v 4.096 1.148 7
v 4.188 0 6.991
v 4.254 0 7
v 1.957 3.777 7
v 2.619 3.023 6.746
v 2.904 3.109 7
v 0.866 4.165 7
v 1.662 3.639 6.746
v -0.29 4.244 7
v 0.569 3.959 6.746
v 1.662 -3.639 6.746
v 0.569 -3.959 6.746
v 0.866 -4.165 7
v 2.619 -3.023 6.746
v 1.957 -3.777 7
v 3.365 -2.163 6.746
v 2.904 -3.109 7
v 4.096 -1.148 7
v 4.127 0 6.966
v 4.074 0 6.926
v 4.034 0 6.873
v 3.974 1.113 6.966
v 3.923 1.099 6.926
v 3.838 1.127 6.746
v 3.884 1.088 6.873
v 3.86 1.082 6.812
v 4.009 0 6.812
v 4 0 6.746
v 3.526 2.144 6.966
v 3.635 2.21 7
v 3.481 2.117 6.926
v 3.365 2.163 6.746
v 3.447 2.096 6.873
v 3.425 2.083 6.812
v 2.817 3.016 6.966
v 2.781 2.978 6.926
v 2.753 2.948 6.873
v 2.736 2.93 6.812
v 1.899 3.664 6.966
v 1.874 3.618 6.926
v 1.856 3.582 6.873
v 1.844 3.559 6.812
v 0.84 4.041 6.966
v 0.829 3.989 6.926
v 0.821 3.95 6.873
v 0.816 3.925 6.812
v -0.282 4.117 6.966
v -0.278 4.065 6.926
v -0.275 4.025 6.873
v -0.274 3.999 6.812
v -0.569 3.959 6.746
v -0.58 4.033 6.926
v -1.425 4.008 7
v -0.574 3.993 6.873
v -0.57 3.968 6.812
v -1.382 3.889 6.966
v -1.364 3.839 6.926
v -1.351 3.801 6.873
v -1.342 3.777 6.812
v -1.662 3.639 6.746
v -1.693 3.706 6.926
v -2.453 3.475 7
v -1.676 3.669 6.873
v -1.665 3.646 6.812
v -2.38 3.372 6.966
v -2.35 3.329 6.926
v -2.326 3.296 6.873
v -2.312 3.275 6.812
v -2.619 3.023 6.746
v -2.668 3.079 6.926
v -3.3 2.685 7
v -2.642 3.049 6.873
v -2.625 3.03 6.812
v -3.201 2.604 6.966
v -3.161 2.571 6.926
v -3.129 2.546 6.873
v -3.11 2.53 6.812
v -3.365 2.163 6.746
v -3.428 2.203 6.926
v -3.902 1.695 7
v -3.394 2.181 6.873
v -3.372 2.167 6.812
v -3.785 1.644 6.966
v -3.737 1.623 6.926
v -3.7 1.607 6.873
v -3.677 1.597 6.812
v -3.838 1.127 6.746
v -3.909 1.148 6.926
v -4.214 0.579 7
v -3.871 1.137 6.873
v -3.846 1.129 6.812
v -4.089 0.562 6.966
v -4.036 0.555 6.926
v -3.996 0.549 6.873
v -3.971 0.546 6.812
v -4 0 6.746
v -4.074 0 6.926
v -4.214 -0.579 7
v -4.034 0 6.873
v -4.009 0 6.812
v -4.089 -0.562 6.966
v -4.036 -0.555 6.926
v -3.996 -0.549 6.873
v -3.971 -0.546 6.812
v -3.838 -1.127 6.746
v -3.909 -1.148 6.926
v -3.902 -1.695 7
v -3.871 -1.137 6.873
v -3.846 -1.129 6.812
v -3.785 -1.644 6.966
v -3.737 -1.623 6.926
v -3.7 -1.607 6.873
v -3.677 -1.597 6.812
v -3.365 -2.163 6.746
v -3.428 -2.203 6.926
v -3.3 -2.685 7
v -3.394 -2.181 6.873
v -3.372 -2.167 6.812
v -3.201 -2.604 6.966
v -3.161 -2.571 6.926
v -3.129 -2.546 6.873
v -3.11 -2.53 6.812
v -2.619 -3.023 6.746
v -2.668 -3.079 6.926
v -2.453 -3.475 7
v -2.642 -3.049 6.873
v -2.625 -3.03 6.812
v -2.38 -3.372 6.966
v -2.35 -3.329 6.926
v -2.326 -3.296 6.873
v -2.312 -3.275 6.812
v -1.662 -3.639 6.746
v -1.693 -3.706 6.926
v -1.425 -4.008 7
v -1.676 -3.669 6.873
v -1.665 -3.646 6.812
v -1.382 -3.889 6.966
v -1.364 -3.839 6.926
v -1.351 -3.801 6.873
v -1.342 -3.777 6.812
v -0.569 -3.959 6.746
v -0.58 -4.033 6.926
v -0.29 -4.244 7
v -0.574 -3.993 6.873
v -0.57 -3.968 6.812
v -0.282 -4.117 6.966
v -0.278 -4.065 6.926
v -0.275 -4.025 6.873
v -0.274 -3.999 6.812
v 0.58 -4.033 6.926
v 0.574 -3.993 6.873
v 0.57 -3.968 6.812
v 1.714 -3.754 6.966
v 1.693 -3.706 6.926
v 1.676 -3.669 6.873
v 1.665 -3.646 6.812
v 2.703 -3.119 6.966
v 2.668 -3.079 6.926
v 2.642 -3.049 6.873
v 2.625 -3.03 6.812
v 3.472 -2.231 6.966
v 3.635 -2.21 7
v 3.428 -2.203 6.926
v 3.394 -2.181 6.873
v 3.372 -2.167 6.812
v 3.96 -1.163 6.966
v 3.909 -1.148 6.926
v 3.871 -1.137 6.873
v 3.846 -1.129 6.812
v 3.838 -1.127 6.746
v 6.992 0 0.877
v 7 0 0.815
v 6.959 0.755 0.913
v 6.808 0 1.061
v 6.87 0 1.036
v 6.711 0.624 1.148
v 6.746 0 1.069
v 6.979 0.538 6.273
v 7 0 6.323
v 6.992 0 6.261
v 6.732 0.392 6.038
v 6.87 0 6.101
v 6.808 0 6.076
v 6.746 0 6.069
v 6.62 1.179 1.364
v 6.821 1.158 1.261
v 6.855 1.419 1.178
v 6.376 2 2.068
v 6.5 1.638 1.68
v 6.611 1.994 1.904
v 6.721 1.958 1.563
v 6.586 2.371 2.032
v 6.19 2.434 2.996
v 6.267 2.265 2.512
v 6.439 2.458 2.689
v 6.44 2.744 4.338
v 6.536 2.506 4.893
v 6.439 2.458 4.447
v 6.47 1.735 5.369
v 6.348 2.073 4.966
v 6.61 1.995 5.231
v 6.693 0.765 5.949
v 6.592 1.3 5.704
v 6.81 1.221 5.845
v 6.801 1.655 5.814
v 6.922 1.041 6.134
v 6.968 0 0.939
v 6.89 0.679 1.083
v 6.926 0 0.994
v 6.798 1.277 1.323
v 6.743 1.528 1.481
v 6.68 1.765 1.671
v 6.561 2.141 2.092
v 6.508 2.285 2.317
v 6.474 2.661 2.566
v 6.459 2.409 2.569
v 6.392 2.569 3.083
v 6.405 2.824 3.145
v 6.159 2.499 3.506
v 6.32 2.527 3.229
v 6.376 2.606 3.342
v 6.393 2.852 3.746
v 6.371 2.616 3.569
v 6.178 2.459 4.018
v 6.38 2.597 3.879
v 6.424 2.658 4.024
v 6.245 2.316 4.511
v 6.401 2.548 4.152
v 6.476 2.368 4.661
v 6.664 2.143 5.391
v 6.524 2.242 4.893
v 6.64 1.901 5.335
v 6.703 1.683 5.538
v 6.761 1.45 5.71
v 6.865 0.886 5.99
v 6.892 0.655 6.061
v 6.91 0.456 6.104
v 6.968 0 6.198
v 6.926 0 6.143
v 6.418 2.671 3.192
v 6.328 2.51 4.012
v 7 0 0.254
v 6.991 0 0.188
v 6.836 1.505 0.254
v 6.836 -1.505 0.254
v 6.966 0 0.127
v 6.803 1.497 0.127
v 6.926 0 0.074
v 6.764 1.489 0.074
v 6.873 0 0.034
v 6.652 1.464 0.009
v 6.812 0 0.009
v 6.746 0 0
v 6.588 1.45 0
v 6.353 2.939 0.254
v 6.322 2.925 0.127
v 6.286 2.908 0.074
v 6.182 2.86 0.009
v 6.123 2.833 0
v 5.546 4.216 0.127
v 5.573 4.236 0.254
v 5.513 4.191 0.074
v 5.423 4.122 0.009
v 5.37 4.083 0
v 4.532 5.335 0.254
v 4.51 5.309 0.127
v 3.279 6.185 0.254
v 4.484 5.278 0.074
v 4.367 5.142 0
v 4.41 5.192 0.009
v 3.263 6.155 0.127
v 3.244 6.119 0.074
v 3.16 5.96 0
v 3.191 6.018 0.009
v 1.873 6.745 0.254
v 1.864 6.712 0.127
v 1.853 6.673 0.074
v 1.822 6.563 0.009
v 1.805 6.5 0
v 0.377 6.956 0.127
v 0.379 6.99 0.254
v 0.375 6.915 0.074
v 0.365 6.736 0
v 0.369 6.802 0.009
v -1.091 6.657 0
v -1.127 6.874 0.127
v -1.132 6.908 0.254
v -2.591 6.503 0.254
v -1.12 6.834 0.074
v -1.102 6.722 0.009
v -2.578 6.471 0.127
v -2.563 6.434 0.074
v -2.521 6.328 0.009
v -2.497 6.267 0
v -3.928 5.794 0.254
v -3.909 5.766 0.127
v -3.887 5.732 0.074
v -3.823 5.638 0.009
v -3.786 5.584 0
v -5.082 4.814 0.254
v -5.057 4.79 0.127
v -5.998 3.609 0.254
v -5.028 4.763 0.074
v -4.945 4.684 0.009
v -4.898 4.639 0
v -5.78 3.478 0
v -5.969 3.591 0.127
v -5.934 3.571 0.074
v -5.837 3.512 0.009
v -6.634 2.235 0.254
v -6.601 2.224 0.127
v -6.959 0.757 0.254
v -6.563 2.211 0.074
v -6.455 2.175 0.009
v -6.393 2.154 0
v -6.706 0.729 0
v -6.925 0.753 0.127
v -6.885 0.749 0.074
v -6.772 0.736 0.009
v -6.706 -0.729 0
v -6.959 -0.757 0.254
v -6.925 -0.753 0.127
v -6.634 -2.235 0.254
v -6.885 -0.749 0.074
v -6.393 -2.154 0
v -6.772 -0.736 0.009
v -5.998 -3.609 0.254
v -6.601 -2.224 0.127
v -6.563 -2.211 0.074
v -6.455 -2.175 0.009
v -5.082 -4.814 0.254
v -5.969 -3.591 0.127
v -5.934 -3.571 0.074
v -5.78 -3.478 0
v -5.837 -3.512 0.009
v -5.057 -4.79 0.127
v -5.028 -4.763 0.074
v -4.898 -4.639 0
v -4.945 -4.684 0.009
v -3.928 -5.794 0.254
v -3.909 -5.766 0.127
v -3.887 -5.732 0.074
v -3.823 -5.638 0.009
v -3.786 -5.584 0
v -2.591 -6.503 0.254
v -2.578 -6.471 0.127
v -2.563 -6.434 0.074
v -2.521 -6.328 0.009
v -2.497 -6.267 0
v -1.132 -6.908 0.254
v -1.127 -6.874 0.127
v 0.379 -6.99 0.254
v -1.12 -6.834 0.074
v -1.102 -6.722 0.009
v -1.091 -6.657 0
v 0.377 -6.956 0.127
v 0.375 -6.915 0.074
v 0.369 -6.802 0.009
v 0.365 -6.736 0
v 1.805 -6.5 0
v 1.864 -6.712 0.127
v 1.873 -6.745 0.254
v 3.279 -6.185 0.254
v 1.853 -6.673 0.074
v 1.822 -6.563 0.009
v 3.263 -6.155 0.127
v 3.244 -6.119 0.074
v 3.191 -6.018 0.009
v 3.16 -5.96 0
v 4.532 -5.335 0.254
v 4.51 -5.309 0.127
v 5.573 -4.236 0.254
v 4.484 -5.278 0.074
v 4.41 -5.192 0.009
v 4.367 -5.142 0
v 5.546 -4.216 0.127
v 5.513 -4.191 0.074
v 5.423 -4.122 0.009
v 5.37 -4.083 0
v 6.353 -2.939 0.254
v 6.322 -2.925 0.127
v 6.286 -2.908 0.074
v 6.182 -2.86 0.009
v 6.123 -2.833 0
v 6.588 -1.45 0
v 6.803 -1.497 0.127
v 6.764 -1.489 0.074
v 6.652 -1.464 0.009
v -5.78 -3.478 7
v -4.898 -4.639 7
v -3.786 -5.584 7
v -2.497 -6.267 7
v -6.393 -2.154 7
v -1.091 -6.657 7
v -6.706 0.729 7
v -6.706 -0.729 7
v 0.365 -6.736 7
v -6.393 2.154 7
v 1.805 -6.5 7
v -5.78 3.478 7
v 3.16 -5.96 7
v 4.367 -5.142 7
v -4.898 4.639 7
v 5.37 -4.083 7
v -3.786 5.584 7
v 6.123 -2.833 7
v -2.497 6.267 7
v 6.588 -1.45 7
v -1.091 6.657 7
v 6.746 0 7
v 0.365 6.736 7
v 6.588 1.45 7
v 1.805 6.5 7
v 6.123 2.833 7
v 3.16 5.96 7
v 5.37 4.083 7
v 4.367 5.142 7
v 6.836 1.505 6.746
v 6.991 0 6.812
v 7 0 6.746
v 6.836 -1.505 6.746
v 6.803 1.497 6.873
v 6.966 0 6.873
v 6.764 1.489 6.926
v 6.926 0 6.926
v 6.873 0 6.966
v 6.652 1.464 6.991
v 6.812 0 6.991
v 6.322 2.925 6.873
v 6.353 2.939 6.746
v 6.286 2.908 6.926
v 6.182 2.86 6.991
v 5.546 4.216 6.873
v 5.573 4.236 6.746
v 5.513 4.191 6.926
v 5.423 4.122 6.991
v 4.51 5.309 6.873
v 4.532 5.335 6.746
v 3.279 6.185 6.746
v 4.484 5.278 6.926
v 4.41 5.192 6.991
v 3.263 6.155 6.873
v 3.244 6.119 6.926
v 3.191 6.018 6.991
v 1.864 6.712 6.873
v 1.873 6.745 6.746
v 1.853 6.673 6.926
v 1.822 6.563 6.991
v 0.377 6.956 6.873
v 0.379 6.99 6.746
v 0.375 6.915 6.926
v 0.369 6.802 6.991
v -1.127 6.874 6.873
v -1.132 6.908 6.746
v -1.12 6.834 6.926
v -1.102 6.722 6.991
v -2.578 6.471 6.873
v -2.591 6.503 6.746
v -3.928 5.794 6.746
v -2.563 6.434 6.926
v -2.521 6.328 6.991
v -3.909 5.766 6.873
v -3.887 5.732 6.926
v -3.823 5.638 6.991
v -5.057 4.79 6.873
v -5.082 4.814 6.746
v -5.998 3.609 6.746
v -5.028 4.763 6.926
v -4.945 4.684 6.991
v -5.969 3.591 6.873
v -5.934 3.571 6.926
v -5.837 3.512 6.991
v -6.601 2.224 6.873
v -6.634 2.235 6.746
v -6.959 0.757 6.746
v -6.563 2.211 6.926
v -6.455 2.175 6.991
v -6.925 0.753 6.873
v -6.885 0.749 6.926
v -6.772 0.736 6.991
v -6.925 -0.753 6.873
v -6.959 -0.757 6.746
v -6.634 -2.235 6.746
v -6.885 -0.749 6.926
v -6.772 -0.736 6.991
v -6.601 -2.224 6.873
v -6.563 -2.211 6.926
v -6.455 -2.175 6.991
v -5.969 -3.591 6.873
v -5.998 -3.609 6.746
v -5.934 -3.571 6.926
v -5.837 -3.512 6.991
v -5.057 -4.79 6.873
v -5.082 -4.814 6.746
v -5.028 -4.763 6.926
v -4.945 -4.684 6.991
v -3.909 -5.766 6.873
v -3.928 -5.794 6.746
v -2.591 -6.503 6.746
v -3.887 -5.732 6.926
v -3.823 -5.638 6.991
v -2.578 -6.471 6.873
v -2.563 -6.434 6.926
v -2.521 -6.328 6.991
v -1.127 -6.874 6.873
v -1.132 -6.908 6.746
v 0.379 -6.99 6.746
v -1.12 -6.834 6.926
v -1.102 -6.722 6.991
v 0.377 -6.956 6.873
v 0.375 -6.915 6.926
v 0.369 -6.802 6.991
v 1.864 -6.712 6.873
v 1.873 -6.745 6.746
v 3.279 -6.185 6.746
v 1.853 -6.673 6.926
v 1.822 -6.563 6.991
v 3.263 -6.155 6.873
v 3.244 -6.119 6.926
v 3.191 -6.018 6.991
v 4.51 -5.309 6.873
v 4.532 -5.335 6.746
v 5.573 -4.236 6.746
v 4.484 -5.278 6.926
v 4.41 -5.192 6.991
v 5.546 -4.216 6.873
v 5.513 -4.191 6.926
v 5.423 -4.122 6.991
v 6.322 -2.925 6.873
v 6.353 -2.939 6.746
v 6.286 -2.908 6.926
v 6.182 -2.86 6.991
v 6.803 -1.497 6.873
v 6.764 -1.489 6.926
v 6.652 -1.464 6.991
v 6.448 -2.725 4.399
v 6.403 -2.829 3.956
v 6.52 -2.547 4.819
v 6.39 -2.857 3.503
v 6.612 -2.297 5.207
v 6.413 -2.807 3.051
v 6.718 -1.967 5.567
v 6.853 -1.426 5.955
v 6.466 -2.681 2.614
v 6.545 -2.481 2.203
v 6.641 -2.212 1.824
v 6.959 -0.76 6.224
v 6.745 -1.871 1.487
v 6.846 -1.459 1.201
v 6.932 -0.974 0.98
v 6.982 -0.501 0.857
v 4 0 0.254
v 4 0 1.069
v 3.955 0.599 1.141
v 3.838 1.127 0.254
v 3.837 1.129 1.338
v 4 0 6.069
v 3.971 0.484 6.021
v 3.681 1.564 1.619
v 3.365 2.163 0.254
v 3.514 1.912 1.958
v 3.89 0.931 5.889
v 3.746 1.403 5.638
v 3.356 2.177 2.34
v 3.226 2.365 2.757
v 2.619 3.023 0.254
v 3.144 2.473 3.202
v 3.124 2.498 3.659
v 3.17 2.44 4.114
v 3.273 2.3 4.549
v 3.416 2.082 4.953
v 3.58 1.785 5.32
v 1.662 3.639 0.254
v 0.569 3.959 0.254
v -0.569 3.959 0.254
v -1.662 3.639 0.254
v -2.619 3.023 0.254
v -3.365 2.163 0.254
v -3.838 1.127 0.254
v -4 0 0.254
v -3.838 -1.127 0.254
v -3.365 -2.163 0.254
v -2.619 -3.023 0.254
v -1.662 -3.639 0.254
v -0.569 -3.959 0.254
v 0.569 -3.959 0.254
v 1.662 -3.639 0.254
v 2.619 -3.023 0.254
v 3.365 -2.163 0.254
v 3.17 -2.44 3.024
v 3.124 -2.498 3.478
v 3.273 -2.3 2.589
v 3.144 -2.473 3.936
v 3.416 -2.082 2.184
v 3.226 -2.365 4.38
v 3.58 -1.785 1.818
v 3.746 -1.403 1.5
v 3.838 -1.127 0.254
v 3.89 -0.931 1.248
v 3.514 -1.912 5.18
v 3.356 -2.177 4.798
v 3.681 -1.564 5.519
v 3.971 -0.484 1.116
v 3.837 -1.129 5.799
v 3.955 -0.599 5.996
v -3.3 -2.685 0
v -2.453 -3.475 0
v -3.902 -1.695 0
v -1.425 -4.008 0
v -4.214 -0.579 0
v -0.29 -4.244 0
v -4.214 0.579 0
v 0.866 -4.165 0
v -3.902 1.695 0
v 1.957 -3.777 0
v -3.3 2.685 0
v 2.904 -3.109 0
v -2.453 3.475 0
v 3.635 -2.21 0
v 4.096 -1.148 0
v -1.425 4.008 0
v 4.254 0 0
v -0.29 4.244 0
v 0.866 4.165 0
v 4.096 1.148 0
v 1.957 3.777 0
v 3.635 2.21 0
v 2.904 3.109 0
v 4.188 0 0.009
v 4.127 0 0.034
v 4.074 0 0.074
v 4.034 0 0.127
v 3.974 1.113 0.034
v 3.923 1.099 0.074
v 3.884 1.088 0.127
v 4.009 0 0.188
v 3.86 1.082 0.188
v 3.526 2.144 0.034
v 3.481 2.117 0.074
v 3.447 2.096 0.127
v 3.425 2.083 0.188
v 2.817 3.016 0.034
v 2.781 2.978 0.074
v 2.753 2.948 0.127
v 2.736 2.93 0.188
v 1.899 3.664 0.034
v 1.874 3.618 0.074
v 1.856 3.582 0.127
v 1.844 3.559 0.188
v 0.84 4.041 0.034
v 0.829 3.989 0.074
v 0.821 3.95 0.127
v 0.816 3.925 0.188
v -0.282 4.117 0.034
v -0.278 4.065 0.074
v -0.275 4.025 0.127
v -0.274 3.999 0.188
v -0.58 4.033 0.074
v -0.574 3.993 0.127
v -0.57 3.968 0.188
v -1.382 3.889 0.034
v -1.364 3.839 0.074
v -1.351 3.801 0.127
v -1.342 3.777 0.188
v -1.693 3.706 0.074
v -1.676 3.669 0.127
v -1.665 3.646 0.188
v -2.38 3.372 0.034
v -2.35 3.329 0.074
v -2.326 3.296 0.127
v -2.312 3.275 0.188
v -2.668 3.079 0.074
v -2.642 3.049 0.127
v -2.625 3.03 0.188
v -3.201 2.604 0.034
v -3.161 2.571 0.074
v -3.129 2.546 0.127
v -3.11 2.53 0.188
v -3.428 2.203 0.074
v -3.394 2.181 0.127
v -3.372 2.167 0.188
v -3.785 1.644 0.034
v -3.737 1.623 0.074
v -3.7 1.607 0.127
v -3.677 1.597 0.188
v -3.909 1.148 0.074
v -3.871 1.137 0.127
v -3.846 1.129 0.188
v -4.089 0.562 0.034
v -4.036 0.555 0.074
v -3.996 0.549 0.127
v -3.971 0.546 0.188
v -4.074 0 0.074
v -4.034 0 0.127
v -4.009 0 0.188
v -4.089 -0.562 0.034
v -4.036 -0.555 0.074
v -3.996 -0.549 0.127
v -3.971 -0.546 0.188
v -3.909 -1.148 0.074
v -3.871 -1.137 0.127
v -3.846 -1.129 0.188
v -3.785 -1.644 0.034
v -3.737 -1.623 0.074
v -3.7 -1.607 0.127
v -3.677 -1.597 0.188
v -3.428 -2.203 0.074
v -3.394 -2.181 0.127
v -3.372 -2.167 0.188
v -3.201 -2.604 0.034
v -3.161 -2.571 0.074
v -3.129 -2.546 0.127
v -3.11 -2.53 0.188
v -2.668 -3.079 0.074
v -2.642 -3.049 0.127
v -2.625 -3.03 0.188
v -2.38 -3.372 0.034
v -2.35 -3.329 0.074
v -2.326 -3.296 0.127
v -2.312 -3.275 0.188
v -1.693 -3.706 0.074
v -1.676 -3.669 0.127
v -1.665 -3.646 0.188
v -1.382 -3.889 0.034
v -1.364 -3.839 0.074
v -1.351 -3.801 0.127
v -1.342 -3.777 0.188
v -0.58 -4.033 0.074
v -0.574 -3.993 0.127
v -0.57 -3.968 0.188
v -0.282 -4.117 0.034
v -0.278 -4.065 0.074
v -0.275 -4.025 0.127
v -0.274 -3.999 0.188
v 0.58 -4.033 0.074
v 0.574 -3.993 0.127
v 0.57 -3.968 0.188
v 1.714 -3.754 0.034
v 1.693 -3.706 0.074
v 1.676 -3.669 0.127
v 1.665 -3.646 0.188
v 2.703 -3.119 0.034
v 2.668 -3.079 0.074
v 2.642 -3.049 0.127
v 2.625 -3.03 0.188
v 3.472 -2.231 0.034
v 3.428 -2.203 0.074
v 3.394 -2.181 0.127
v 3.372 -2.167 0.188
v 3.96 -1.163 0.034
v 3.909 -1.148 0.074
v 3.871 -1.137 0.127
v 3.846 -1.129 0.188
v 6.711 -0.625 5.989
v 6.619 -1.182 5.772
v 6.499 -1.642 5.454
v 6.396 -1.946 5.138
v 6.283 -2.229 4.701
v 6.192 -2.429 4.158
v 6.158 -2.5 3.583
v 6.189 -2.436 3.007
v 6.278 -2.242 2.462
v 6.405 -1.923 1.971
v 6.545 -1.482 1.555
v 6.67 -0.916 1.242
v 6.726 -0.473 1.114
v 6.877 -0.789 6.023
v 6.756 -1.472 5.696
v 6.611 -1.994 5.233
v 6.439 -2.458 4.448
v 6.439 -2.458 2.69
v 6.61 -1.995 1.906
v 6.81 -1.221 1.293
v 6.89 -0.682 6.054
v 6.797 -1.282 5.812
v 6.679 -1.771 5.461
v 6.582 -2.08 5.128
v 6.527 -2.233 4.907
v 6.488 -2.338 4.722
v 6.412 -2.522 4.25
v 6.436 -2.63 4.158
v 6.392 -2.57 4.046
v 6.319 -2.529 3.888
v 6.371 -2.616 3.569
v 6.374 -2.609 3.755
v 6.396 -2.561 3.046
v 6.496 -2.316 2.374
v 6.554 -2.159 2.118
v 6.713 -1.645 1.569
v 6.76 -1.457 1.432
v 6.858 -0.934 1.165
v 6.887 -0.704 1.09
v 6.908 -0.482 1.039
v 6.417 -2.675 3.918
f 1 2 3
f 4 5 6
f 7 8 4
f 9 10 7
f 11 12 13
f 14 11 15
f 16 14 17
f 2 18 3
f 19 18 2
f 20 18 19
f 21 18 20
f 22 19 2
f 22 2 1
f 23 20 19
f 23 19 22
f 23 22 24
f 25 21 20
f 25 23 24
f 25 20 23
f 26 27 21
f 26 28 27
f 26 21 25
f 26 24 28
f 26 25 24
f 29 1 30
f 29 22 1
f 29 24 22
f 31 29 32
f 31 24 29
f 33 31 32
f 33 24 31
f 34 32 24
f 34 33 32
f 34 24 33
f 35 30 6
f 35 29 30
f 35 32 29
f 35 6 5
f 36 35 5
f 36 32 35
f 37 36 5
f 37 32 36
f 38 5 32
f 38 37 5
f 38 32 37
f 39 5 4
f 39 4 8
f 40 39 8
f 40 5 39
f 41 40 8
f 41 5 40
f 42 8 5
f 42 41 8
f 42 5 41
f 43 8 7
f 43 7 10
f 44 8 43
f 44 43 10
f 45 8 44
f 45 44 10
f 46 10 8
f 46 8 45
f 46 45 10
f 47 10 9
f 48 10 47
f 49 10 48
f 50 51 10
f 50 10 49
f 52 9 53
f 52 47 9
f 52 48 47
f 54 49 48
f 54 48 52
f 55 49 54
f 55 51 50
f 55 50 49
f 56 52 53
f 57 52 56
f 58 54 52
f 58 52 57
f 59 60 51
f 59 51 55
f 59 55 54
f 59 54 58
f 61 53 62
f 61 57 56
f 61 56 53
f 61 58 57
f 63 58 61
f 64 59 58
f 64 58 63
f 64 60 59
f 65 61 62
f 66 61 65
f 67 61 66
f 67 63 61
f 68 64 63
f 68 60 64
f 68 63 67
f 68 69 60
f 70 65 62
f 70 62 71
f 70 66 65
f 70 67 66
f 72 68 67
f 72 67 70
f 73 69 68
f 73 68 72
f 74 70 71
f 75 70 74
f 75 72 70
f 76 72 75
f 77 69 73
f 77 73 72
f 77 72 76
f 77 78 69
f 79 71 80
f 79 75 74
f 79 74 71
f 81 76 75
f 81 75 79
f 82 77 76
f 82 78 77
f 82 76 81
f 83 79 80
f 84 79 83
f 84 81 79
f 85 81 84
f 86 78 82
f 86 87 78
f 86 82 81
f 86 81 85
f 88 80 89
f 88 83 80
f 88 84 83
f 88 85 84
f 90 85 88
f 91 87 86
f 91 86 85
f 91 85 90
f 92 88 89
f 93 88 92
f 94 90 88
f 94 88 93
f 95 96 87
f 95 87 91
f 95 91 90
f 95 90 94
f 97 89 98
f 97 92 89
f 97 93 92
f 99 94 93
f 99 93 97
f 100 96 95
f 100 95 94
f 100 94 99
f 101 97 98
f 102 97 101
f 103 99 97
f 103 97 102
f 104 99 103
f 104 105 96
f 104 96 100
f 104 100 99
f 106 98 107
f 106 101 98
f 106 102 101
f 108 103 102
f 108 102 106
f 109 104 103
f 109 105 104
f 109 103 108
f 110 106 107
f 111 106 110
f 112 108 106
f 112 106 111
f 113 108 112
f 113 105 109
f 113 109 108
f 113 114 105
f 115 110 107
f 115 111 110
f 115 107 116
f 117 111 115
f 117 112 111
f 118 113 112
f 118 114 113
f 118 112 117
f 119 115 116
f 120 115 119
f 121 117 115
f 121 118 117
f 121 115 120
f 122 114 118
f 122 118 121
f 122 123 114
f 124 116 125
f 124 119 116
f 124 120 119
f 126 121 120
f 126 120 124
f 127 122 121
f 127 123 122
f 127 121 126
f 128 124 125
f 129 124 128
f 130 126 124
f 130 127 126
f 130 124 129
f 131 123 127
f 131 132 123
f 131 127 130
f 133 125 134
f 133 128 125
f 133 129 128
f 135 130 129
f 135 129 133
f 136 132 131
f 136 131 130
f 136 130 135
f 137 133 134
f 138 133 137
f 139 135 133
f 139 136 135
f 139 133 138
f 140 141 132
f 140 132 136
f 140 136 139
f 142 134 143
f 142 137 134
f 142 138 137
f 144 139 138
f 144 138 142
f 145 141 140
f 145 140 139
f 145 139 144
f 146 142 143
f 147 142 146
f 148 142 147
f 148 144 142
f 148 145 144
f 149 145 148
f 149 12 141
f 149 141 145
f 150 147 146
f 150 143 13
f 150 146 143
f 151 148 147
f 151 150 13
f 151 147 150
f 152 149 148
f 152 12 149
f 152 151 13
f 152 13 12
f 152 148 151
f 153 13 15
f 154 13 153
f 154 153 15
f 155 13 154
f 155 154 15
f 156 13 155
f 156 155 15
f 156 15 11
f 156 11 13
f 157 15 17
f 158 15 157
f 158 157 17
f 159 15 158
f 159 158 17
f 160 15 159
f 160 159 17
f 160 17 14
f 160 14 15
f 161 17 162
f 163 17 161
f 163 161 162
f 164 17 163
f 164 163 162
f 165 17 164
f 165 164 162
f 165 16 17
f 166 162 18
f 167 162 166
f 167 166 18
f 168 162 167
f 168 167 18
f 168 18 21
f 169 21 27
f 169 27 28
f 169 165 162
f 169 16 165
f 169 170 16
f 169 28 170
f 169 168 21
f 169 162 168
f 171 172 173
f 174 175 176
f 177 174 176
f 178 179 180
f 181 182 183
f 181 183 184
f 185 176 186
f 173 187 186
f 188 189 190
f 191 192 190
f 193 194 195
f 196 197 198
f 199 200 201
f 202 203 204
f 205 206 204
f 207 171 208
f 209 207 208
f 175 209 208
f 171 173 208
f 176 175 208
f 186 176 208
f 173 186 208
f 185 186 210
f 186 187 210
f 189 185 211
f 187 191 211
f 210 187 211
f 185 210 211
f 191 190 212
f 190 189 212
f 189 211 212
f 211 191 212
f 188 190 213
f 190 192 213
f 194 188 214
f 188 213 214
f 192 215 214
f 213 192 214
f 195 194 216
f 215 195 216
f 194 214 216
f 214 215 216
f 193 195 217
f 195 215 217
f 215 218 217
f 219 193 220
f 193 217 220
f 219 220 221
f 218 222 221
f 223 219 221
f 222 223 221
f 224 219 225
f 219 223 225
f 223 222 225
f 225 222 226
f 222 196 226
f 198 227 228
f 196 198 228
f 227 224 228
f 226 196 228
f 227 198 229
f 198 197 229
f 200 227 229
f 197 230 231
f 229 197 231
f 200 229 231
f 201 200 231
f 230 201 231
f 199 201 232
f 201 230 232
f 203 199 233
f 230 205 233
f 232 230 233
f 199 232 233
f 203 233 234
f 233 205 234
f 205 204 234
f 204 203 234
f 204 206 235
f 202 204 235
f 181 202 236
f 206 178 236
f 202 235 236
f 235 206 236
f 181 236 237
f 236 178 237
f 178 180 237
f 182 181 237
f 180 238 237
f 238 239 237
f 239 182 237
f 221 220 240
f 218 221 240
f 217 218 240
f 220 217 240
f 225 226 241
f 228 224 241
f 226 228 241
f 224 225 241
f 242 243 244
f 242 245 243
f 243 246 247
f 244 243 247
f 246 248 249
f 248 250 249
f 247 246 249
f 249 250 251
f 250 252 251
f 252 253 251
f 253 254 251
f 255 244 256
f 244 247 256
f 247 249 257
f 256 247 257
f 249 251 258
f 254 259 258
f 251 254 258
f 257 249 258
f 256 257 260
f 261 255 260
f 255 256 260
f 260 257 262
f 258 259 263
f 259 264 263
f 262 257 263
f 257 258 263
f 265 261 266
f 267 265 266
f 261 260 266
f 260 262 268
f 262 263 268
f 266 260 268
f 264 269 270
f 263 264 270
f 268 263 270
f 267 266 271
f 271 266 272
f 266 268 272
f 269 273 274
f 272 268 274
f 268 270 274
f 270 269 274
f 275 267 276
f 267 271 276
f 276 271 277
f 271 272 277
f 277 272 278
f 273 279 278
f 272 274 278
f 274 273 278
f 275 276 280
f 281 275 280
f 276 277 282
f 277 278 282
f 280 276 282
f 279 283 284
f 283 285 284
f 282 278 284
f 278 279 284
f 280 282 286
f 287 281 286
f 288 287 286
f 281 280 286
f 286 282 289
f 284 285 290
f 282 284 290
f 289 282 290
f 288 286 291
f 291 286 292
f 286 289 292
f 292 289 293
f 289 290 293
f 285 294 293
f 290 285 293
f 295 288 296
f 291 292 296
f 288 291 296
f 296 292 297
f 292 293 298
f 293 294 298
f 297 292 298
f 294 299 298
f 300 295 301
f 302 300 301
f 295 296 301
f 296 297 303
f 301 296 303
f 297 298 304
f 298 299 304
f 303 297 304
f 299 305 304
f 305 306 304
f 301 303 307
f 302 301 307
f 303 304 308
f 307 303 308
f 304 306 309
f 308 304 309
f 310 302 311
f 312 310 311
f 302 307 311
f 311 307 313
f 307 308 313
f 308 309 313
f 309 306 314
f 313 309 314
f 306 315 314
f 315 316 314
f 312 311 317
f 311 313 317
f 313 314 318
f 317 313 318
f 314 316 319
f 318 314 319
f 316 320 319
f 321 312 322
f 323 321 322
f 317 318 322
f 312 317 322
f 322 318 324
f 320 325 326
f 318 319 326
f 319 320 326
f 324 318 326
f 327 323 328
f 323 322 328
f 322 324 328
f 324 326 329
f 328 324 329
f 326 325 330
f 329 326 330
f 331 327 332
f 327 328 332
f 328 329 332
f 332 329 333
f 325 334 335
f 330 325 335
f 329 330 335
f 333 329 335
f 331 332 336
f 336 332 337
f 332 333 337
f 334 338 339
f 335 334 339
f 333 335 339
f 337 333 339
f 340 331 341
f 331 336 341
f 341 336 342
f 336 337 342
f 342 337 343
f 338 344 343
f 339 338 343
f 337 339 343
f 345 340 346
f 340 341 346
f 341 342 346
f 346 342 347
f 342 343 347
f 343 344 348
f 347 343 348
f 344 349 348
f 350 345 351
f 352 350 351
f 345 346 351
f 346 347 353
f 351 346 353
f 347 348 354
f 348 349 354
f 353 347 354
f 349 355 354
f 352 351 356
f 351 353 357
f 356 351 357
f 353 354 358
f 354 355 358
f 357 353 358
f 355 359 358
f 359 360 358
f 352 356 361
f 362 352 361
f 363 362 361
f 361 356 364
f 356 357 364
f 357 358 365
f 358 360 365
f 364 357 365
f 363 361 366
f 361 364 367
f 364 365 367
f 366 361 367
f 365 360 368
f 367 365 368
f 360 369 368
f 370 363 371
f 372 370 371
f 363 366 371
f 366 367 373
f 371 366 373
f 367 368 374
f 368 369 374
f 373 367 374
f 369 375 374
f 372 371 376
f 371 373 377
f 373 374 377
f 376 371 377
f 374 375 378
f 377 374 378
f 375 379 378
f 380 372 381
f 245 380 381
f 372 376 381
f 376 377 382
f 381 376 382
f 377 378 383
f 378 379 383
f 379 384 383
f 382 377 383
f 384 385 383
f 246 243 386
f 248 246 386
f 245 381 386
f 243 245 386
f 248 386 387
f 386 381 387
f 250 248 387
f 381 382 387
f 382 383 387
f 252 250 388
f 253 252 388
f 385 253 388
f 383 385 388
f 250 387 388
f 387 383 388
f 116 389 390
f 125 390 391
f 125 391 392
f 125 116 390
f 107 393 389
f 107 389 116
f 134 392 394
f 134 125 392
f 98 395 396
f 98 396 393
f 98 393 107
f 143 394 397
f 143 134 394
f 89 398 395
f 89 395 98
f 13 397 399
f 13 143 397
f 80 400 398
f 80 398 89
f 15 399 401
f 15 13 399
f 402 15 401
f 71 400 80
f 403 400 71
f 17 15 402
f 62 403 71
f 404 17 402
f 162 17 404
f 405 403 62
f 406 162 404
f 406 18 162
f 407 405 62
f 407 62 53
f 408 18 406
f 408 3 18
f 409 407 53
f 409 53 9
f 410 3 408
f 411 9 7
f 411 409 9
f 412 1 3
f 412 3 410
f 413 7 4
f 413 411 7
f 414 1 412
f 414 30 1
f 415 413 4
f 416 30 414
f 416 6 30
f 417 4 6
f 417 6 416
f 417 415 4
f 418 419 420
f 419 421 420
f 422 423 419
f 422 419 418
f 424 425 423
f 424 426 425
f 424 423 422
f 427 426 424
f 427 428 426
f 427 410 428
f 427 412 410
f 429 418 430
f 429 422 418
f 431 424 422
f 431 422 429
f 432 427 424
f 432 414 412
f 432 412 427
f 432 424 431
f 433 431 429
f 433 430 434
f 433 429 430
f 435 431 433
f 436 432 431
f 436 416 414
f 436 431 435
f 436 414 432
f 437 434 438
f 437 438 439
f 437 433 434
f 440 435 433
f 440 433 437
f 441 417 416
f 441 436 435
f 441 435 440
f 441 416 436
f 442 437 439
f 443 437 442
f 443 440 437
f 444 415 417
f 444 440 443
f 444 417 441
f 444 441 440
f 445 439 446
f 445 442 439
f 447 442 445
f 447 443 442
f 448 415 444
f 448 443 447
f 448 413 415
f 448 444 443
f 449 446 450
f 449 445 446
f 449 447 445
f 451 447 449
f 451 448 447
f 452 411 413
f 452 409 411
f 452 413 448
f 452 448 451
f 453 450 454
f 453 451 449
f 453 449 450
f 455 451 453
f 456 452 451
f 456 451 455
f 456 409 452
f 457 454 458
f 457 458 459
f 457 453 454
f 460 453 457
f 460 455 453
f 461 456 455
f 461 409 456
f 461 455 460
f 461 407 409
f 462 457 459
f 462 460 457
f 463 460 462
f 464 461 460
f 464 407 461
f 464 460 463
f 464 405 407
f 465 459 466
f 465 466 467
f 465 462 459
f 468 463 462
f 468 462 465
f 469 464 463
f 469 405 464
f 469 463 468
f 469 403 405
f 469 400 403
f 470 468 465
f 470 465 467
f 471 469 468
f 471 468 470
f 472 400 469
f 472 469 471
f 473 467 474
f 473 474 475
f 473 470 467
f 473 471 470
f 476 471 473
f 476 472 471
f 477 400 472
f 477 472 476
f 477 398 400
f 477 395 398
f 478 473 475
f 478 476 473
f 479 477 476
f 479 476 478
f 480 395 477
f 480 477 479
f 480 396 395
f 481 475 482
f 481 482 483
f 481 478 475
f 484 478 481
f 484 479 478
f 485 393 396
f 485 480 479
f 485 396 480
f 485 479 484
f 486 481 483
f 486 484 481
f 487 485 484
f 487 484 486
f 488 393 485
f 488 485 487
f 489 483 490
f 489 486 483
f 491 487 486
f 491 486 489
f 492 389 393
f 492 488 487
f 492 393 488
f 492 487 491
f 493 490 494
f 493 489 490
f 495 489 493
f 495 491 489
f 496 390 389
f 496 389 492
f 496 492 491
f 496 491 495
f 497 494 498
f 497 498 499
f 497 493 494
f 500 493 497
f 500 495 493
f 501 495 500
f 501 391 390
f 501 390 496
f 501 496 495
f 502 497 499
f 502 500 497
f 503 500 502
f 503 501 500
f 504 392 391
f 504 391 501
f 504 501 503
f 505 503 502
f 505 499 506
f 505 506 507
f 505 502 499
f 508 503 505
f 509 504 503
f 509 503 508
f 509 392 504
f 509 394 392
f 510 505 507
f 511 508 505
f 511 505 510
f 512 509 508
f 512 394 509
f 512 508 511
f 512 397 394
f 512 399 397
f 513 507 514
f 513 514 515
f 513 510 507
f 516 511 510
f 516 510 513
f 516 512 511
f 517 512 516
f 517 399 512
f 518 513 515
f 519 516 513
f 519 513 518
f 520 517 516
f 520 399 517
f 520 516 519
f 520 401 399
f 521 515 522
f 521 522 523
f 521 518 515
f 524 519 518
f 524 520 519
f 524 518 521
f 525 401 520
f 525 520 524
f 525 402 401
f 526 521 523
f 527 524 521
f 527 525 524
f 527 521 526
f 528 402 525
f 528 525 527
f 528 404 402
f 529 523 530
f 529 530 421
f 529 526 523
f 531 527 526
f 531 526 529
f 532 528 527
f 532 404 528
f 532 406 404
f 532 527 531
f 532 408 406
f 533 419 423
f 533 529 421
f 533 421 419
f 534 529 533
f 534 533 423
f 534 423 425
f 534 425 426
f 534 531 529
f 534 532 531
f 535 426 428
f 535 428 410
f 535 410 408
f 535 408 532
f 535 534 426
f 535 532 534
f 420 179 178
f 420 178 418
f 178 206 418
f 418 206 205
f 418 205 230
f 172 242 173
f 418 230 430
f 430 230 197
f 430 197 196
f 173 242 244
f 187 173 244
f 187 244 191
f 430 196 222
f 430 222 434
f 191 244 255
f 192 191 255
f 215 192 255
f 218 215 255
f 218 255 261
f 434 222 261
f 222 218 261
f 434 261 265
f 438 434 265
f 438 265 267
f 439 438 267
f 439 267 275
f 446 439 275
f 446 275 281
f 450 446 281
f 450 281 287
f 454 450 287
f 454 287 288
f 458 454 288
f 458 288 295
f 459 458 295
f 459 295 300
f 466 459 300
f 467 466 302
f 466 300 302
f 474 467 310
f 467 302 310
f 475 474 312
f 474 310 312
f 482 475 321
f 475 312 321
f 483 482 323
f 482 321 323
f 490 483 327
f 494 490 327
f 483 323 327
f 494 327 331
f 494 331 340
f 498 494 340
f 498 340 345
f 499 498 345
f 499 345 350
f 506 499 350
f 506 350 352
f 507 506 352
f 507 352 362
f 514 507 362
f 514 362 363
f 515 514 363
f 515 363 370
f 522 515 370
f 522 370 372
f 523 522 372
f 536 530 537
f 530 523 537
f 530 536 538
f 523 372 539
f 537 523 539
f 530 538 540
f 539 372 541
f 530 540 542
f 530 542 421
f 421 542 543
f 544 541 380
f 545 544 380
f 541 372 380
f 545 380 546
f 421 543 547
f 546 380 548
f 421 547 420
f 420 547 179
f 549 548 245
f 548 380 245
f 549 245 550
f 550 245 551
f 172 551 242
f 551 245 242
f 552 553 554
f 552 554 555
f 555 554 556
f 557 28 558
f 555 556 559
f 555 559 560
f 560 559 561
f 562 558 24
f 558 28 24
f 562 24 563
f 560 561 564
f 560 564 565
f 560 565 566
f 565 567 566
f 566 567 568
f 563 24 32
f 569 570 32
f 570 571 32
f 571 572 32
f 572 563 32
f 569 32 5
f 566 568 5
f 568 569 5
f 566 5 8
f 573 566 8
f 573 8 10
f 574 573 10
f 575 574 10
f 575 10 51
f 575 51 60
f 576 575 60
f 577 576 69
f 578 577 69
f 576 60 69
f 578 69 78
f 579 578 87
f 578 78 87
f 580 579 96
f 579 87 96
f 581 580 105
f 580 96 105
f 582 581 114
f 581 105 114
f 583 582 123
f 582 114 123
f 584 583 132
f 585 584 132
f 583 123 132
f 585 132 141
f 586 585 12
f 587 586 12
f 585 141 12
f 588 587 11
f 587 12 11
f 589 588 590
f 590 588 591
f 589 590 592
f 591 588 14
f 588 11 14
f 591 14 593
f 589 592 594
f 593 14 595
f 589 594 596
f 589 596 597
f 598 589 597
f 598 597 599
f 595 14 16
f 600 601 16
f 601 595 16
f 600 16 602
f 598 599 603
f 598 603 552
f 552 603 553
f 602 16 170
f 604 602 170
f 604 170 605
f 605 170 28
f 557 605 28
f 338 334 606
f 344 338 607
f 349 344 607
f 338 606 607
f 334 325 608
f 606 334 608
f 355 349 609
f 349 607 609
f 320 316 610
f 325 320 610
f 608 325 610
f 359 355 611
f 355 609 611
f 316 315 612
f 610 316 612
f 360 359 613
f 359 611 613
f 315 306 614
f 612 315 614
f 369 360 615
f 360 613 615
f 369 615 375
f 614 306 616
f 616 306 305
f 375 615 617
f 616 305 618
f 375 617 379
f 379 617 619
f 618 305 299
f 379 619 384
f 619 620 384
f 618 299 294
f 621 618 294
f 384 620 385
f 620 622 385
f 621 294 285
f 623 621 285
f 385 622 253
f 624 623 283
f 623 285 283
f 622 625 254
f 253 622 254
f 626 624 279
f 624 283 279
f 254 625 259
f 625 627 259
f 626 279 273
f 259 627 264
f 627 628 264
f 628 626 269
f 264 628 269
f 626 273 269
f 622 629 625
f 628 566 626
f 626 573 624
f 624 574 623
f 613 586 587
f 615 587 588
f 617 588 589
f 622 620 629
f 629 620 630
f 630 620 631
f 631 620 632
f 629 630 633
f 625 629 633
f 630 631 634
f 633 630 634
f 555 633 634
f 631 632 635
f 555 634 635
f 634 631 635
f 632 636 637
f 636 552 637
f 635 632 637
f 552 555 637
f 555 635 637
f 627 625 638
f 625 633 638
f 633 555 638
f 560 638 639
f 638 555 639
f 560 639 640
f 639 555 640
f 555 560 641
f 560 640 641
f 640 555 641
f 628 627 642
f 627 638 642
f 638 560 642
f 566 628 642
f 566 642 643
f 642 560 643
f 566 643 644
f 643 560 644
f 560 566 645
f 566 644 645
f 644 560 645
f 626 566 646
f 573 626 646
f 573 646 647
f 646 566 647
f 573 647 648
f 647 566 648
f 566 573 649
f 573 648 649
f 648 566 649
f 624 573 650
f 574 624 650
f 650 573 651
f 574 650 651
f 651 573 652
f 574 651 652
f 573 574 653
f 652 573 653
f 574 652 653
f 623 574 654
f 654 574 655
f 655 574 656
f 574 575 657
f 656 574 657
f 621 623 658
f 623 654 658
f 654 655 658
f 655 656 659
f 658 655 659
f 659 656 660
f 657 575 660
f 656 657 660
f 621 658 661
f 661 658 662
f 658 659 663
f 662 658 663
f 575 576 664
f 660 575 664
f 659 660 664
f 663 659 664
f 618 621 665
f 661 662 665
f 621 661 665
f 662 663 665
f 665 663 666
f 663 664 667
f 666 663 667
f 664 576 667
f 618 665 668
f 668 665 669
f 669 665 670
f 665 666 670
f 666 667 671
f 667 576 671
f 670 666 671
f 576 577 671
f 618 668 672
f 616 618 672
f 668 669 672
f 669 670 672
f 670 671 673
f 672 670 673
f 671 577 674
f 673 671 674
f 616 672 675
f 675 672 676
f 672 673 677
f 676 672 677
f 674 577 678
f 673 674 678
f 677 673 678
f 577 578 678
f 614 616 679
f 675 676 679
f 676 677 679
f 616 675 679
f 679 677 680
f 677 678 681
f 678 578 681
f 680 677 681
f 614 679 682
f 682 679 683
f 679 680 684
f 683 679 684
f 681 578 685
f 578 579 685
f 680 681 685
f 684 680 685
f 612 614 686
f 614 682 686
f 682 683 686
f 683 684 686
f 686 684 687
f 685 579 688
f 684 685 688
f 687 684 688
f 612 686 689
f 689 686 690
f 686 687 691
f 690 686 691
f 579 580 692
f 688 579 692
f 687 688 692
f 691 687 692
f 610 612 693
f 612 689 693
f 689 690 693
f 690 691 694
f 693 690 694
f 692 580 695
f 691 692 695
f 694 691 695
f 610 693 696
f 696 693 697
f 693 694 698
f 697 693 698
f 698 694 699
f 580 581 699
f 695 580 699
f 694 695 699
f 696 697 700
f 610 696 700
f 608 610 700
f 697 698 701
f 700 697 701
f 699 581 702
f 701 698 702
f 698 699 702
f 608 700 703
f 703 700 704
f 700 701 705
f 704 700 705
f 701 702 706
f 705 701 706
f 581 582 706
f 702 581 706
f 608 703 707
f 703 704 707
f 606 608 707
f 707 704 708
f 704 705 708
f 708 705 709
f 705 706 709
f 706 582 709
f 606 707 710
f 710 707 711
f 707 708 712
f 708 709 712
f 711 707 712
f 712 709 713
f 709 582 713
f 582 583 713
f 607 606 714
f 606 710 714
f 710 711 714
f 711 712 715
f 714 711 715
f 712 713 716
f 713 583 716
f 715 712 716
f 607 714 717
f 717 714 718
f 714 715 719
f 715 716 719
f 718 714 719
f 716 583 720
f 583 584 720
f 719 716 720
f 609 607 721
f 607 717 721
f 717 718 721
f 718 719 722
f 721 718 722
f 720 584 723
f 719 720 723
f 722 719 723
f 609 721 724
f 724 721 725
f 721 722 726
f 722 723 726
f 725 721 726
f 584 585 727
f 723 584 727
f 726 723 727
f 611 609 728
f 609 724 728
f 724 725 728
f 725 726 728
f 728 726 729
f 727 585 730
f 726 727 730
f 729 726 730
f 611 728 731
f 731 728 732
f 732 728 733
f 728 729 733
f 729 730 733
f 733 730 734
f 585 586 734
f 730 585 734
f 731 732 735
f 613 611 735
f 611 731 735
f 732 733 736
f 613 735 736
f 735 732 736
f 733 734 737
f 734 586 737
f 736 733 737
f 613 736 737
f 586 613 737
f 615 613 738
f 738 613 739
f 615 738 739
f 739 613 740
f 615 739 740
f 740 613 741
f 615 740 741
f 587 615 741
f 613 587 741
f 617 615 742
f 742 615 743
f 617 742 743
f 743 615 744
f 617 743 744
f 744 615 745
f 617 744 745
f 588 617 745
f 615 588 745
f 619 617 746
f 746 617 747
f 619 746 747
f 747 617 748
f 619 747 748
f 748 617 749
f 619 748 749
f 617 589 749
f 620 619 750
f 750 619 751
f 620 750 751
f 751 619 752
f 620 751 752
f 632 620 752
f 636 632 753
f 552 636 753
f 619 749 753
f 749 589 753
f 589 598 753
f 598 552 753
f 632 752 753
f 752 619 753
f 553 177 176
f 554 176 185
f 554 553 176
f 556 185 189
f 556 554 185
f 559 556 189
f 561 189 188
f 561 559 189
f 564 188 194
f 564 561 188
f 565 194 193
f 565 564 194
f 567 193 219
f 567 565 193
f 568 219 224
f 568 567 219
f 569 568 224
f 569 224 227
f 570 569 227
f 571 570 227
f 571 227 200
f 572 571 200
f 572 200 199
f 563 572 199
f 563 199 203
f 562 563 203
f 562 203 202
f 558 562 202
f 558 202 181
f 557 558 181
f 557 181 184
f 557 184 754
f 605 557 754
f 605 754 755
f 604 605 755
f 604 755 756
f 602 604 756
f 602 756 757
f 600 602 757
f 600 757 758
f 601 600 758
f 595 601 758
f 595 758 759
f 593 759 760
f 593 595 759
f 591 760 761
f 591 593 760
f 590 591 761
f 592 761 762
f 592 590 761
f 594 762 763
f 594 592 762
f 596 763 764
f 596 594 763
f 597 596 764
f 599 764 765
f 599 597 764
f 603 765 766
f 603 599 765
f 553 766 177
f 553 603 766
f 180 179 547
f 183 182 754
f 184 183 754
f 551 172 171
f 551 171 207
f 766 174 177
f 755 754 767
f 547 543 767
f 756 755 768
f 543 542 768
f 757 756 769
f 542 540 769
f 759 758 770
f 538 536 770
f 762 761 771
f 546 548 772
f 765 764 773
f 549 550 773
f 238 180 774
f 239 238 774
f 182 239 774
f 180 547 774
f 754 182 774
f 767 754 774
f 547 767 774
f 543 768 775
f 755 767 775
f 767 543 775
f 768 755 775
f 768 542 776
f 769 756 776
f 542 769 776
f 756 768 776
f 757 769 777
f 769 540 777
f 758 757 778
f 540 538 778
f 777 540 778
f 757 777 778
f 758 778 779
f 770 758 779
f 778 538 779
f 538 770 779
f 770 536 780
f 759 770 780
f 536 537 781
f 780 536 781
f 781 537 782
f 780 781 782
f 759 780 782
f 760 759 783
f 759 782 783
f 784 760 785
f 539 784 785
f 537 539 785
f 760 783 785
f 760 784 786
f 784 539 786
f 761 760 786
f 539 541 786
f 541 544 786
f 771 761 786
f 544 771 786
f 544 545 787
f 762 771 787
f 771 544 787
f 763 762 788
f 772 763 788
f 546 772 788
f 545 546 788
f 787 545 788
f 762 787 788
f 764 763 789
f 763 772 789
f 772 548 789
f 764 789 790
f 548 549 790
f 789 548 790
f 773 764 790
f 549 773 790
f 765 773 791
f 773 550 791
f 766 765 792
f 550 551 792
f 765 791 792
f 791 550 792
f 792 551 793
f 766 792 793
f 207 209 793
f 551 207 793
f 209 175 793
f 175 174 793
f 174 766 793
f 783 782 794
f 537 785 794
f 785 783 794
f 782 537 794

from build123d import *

# Parameters (mm, degrees)
SKETCH2_R           = 7
BOSS_EXTRUDE1_DEPTH = 7
SKETCH3_R           = 4
CUT_EXTRUDE1_DEPTH  = 8
SKETCH4_R           = 2.499999953
CUT_EXTRUDE2_DEPTH  = 8
FILLET1_R           = 0.254


with BuildPart() as part:
    # Sketch2 → Boss-Extrude1 (new body)
    with BuildSketch(Plane.XY):
        Circle(SKETCH2_R)
    extrude(amount=BOSS_EXTRUDE1_DEPTH)

    # Sketch3 → Cut-Extrude1 (cut, through all)
    with BuildSketch(Plane.XY.offset(7)):
        Circle(SKETCH3_R)
    extrude(amount=-CUT_EXTRUDE1_DEPTH, mode=Mode.SUBTRACT)

    # Sketch4 → Cut-Extrude2 (cut, through all)
    with BuildSketch(Plane(origin=(0, 0, 0), x_dir=(0, 0, -1), z_dir=(1, 0, 0))):
        with Locations((-3.5687, 0)):
            Circle(SKETCH4_R)
    extrude(amount=CUT_EXTRUDE2_DEPTH, mode=Mode.SUBTRACT)

    # Fillet1
    fillet1_edges = [part.edges().sort_by_distance(p)[0] for p in [
        (6.538348433, 2.499999953, 3.5687),
        (-7, 0, 0),
        (-7, 0, 7),
        (-4, 0, 0),
        (-4, 0, 7),
    ]]
    fillet(fillet1_edges, radius=FILLET1_R)


solid = part.part
